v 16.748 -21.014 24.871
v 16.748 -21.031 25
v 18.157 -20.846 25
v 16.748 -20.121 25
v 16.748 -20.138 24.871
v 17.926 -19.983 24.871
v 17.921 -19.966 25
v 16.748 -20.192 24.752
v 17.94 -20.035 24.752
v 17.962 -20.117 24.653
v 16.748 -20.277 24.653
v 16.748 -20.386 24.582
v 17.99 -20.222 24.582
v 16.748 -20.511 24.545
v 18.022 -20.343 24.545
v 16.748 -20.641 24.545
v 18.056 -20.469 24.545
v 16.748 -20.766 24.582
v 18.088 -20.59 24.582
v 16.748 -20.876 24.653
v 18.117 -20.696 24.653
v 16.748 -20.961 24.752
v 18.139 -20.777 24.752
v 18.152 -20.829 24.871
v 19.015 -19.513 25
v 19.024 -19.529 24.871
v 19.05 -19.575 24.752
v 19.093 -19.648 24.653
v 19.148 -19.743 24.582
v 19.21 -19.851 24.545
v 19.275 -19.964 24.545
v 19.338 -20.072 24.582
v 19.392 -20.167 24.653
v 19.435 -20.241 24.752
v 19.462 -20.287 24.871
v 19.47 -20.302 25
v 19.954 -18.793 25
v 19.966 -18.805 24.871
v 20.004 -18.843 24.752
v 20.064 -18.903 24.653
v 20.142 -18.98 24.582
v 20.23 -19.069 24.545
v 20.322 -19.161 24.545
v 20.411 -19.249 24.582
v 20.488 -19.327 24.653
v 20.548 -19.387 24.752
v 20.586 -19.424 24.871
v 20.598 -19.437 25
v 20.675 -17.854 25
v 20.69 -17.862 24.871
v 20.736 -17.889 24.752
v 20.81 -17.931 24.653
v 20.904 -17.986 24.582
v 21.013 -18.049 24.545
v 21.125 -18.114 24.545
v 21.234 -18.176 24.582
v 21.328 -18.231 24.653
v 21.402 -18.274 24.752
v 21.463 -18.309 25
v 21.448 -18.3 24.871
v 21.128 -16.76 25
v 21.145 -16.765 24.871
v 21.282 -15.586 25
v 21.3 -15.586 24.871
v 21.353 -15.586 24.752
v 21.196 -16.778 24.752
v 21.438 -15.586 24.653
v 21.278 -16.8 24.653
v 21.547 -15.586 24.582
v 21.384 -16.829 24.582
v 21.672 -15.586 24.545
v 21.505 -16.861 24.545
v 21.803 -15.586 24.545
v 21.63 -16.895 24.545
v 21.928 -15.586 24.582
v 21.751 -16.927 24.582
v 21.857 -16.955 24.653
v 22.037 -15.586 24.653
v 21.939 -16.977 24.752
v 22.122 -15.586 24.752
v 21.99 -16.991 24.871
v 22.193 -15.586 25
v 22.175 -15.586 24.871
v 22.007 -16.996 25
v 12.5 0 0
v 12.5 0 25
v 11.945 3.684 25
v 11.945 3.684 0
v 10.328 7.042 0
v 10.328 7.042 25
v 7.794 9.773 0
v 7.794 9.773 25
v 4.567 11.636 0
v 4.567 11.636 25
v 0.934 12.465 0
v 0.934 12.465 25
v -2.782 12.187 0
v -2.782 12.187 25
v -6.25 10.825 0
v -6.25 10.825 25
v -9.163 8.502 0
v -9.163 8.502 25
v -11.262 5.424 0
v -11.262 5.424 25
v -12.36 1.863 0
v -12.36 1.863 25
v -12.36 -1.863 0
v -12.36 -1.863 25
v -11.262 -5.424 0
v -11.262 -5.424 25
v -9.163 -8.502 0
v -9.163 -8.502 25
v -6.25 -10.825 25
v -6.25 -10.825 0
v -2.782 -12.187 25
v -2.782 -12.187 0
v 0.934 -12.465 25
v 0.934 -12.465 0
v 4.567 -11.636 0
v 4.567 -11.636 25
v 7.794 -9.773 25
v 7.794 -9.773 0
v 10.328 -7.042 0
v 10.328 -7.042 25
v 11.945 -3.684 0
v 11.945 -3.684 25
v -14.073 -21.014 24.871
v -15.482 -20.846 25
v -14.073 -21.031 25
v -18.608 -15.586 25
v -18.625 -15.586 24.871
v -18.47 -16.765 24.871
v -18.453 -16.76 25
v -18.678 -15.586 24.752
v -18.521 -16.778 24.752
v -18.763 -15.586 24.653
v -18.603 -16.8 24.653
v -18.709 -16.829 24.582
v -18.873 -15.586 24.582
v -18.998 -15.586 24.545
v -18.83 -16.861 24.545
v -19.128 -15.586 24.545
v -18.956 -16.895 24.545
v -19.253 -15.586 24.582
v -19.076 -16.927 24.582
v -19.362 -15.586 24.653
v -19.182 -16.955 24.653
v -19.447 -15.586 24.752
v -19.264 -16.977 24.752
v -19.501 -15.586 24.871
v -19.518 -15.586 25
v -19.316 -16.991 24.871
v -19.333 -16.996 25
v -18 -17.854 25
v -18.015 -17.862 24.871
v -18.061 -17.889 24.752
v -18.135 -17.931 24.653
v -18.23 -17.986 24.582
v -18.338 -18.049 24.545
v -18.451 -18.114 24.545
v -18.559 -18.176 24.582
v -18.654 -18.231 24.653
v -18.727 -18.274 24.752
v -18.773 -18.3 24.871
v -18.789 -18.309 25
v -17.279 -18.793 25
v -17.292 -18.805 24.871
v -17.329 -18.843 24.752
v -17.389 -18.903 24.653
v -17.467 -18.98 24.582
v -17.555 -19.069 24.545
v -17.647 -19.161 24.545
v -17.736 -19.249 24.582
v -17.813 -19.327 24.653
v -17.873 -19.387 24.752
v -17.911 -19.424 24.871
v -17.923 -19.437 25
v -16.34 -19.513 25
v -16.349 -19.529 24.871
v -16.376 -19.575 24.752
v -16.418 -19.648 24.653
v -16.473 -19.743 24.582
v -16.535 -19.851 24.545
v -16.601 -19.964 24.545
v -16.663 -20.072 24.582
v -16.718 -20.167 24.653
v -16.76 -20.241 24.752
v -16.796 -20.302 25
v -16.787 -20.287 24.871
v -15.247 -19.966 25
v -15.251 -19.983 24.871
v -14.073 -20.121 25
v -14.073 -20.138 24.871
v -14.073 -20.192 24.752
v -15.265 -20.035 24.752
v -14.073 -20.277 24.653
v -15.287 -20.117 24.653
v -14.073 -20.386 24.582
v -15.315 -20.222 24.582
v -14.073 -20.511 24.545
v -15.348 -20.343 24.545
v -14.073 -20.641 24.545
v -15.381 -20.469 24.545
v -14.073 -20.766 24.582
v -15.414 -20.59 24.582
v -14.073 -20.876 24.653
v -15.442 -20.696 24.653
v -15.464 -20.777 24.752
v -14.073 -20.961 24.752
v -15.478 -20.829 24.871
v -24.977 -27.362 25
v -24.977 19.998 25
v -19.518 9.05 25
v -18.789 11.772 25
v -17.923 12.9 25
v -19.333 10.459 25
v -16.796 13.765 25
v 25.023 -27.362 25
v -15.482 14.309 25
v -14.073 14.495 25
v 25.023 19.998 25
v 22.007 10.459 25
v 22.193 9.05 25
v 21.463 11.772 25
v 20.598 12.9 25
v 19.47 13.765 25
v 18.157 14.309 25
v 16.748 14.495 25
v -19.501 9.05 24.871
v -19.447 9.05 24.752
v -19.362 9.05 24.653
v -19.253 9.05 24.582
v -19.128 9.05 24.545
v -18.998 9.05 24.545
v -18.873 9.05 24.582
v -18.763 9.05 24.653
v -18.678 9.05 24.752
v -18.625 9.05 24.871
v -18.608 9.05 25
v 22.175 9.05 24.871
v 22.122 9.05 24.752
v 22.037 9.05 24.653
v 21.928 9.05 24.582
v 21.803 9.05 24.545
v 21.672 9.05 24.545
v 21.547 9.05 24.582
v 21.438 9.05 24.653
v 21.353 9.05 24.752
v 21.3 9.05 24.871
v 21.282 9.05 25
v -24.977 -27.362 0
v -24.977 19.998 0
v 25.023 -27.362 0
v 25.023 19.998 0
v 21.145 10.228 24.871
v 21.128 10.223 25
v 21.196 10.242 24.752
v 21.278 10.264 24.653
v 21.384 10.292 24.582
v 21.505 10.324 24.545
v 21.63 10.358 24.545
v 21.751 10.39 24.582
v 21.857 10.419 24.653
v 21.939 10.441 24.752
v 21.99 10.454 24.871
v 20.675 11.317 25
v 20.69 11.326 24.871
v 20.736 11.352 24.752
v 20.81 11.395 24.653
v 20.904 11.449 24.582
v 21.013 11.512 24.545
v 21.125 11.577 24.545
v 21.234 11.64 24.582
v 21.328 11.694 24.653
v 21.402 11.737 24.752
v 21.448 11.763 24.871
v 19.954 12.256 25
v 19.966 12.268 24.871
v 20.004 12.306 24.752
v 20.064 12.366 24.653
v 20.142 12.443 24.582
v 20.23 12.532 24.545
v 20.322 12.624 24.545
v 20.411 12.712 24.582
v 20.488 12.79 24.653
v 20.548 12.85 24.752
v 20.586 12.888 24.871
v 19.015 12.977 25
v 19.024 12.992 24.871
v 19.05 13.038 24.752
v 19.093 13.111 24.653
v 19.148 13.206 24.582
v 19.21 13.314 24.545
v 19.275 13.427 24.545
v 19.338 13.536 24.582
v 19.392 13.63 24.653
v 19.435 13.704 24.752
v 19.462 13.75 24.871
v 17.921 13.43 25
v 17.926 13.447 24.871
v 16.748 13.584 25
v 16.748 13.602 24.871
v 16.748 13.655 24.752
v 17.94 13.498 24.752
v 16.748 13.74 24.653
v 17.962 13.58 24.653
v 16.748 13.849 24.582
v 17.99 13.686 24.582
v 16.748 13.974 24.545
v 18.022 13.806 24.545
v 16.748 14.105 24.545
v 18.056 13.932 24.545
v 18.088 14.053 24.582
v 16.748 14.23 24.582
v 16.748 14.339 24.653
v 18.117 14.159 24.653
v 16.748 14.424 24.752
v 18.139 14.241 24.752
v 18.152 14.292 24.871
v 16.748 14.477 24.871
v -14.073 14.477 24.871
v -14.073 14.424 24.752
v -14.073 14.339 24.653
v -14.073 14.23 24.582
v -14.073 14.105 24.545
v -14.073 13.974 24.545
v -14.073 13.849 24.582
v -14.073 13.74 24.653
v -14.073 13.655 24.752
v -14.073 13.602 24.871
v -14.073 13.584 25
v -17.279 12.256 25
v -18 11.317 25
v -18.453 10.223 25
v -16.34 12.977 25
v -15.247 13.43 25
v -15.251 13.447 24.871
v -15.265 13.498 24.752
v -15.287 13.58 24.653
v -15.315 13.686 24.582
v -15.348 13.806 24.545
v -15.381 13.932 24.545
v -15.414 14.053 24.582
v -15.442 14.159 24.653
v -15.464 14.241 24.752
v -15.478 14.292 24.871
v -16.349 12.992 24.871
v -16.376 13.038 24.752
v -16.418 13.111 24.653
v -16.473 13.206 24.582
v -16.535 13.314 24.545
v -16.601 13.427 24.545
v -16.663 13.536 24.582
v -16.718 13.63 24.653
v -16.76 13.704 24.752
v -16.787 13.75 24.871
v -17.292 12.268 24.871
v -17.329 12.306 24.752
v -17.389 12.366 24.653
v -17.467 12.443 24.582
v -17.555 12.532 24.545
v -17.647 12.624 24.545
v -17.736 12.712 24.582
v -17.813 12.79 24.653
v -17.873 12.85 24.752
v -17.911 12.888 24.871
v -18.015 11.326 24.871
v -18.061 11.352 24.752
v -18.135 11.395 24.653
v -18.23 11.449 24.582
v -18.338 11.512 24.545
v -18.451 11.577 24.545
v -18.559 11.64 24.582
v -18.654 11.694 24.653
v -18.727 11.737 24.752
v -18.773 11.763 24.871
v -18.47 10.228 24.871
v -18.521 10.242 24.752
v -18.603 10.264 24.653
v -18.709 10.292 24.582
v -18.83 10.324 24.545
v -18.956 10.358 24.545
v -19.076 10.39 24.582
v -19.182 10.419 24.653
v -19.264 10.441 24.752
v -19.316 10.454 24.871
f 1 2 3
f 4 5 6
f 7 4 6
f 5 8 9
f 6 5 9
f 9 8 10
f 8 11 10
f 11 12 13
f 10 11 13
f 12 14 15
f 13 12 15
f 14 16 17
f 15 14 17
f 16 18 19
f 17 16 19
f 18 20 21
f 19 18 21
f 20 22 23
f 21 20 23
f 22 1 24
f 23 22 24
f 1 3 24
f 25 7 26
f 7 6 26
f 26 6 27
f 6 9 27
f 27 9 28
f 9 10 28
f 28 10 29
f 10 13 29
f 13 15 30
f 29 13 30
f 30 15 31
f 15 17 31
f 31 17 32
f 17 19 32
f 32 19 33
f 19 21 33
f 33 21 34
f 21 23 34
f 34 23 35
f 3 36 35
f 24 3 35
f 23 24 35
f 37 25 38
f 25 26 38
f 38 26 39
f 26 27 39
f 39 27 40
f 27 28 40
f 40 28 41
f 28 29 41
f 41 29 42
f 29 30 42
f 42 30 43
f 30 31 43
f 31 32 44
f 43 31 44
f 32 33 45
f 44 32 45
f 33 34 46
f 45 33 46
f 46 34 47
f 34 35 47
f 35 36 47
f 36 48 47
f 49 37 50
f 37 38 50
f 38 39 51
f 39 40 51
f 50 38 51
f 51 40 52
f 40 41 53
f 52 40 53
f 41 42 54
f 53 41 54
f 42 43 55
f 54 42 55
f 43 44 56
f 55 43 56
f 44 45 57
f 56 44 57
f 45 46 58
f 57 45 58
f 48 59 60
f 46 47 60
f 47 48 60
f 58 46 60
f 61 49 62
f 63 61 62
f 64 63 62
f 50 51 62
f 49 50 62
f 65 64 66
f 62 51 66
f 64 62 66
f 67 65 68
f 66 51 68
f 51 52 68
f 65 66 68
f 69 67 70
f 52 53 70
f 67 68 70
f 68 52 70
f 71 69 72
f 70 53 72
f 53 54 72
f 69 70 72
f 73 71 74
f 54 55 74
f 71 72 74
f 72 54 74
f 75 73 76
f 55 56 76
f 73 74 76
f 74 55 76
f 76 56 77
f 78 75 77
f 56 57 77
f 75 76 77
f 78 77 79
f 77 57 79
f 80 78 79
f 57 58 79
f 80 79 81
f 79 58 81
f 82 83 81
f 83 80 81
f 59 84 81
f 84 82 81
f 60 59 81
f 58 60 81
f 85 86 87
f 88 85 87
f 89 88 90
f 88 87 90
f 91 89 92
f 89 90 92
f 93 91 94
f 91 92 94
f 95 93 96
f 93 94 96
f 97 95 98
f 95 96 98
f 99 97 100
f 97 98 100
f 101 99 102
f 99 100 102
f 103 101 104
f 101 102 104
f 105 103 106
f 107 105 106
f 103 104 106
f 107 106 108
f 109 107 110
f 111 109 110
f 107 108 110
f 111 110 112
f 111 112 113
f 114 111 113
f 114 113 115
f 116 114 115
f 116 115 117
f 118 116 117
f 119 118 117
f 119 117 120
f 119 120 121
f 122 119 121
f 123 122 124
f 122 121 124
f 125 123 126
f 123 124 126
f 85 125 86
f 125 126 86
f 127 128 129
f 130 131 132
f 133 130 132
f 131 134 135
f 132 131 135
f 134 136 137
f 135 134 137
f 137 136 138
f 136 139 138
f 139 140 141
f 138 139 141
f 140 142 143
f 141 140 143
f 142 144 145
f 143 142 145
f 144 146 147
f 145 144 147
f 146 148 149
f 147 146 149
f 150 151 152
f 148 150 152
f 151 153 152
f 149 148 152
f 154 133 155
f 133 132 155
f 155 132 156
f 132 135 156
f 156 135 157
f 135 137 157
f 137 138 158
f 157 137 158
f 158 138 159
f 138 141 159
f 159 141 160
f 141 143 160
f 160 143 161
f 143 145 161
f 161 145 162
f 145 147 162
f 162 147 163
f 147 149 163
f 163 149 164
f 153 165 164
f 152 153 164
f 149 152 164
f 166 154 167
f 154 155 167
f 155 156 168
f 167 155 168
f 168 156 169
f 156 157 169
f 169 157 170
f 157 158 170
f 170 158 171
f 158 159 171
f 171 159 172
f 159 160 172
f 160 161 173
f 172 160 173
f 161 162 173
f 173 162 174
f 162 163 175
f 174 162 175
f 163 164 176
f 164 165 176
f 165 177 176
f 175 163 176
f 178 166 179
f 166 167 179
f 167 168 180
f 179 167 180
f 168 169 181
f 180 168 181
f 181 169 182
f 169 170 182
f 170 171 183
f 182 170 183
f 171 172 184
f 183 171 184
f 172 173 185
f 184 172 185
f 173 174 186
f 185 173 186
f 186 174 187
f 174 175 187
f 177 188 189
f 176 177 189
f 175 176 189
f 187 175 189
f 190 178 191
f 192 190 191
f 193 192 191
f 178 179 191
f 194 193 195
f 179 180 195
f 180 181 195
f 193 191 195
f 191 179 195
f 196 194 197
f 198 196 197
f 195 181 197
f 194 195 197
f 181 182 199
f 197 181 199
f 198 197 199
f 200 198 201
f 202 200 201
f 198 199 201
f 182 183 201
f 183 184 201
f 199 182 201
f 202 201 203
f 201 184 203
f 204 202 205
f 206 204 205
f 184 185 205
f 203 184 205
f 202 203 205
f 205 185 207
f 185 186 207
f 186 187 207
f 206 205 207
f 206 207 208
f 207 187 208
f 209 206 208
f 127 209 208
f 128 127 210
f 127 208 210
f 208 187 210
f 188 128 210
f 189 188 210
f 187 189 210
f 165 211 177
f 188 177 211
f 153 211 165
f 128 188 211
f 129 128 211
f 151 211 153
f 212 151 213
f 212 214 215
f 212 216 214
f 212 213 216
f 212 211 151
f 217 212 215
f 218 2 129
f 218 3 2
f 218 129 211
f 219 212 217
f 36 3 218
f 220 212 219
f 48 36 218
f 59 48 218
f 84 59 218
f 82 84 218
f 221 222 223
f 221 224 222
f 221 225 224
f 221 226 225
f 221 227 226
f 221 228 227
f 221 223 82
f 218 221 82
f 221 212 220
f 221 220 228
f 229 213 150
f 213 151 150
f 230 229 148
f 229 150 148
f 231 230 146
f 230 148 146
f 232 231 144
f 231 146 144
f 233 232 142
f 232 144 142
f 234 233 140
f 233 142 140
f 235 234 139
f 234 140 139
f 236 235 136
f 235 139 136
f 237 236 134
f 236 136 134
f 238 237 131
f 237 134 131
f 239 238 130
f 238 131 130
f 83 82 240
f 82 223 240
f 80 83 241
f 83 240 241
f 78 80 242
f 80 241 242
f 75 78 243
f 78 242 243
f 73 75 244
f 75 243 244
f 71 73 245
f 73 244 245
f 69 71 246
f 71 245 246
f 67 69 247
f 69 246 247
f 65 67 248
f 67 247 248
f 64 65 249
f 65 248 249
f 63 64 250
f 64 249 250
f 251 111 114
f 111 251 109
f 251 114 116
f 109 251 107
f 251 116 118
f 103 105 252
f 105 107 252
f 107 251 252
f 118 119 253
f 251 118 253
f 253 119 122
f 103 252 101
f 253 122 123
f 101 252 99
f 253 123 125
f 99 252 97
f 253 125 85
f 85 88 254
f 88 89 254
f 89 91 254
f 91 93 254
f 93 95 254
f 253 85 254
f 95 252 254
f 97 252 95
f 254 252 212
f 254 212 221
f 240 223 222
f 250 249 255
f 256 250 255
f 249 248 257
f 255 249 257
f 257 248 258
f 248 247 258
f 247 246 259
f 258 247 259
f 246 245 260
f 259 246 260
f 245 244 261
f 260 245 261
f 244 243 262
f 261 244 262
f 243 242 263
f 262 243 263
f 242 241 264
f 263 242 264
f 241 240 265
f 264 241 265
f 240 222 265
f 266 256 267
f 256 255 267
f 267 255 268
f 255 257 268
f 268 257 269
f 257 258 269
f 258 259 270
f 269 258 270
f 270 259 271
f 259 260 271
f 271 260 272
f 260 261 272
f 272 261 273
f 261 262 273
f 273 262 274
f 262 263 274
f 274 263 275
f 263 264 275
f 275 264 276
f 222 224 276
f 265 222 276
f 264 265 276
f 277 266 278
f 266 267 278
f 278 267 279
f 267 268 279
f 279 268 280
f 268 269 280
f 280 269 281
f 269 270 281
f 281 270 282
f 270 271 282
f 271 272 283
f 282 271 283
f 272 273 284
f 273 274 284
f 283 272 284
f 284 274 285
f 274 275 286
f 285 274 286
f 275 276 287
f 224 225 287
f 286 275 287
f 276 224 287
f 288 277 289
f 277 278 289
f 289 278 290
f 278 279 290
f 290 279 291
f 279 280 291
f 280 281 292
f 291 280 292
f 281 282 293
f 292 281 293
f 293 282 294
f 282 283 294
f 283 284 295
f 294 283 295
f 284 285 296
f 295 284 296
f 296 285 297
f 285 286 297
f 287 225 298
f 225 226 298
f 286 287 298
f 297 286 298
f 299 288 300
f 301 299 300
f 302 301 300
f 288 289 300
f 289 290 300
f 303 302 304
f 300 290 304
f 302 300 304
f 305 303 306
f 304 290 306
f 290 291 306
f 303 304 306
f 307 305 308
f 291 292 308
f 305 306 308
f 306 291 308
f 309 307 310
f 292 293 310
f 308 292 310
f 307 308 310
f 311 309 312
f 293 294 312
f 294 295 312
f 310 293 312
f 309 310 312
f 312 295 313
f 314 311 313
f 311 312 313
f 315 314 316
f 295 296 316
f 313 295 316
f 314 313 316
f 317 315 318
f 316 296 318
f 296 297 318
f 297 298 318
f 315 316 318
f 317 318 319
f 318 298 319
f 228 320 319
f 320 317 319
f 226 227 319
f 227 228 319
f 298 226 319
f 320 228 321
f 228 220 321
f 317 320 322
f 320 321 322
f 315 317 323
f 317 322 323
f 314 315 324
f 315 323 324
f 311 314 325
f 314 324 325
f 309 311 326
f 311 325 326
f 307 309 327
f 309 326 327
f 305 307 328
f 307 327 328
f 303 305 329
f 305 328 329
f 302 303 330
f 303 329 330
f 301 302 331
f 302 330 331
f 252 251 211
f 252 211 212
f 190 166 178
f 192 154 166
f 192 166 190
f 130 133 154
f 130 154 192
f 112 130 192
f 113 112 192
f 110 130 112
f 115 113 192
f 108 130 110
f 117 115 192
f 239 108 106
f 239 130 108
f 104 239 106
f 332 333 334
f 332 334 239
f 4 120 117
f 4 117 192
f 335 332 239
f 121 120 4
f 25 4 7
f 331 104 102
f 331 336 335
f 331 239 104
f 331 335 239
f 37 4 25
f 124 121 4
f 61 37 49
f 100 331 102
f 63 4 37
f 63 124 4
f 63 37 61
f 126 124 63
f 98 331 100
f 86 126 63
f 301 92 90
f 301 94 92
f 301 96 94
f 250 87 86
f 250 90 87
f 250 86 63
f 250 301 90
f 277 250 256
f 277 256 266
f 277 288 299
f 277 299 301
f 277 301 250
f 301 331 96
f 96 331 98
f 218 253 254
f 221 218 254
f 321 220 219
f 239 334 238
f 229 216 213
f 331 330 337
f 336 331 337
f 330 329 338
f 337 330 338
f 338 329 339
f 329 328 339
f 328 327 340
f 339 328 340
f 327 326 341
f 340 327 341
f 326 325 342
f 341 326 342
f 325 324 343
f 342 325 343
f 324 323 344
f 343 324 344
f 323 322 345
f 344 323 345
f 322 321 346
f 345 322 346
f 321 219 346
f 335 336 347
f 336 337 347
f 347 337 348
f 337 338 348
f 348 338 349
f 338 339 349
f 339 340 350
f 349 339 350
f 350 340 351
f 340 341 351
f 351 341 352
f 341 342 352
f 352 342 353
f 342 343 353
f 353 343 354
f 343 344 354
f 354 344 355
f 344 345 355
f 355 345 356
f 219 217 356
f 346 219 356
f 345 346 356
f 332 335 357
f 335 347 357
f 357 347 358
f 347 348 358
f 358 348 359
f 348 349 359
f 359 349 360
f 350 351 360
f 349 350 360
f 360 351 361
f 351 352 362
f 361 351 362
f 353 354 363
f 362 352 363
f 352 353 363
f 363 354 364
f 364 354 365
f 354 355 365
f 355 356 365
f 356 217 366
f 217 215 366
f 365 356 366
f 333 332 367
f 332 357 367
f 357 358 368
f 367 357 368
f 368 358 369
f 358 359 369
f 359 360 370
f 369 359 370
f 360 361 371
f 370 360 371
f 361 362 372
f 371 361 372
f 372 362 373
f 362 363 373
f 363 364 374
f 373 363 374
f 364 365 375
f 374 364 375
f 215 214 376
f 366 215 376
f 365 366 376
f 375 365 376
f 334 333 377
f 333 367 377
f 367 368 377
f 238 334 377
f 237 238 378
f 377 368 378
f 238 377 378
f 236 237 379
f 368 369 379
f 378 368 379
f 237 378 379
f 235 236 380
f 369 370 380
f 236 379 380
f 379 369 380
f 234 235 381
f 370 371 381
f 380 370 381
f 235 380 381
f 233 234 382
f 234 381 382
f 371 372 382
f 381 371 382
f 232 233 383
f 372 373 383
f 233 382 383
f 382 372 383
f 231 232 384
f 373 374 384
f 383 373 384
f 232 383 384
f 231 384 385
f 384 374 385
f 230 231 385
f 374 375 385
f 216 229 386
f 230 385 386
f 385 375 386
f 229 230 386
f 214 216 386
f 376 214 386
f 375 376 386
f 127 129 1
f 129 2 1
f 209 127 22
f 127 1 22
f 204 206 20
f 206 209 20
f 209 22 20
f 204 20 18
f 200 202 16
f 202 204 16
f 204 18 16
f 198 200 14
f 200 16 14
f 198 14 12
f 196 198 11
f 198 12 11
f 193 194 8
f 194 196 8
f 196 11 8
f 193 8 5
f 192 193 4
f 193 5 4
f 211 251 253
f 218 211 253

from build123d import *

# Parameters (mm, degrees)
F0_W     = 50
F0_H     = 47.3597366856
F1_DEPTH = 25
F2_R     = 12.5
F3_DEPTH = 25
F5_R     = 0.4552551452


with BuildPart() as f1:
    # F0 (on Top) → F1 (new body)
    with BuildSketch(Plane.XY):
        with Locations((0.0229850411, -3.6821365356)):
            Rectangle(F0_W, F0_H)
    extrude(amount=F1_DEPTH)

    # F2 (on face) → F3 (cut, through all)
    with BuildSketch(Plane.XY.offset(25)):
        Circle(F2_R)
    extrude(amount=-F3_DEPTH, mode=Mode.SUBTRACT)

    # F6: sweep along a path in F4
    with BuildLine(Plane.XY.offset(25)) as f6_path:
        Line((-14.0730467439, -20.5863900483), (16.7477343976, -20.5863900483))
        ThreePointArc((16.7477343976, -20.5863900483), (20.2832683036, -19.1219239542), (21.7477343976, -15.5863900483))
        Line((21.7477343976, -15.5863900483), (21.7477343976, 9.0496650711))
        ThreePointArc((21.7477343976, 9.0496650711), (20.2832683036, 12.585198977), (16.7477343976, 14.0496650711))
        Line((16.7477343976, 14.0496650711), (-14.0730467439, 14.0496650711))
        ThreePointArc((-14.0730467439, 14.0496650711), (-17.6085806498, 12.585198977), (-19.0730467439, 9.0496650711))
        Line((-19.0730467439, 9.0496650711), (-19.0730467439, -15.5863900483))
        ThreePointArc((-19.0730467439, -15.5863900483), (-17.6085806498, -19.1219239542), (-14.0730467439, -20.5863900483))
    # F5 (on Right) → F6 (sweep, cut)
    with BuildSketch(Plane.YZ):
        with Locations((-20.5761548132, 24.9956939369)):
            Circle(F5_R)
    sweep(path=f6_path.line, mode=Mode.SUBTRACT)


solid = f1.part
